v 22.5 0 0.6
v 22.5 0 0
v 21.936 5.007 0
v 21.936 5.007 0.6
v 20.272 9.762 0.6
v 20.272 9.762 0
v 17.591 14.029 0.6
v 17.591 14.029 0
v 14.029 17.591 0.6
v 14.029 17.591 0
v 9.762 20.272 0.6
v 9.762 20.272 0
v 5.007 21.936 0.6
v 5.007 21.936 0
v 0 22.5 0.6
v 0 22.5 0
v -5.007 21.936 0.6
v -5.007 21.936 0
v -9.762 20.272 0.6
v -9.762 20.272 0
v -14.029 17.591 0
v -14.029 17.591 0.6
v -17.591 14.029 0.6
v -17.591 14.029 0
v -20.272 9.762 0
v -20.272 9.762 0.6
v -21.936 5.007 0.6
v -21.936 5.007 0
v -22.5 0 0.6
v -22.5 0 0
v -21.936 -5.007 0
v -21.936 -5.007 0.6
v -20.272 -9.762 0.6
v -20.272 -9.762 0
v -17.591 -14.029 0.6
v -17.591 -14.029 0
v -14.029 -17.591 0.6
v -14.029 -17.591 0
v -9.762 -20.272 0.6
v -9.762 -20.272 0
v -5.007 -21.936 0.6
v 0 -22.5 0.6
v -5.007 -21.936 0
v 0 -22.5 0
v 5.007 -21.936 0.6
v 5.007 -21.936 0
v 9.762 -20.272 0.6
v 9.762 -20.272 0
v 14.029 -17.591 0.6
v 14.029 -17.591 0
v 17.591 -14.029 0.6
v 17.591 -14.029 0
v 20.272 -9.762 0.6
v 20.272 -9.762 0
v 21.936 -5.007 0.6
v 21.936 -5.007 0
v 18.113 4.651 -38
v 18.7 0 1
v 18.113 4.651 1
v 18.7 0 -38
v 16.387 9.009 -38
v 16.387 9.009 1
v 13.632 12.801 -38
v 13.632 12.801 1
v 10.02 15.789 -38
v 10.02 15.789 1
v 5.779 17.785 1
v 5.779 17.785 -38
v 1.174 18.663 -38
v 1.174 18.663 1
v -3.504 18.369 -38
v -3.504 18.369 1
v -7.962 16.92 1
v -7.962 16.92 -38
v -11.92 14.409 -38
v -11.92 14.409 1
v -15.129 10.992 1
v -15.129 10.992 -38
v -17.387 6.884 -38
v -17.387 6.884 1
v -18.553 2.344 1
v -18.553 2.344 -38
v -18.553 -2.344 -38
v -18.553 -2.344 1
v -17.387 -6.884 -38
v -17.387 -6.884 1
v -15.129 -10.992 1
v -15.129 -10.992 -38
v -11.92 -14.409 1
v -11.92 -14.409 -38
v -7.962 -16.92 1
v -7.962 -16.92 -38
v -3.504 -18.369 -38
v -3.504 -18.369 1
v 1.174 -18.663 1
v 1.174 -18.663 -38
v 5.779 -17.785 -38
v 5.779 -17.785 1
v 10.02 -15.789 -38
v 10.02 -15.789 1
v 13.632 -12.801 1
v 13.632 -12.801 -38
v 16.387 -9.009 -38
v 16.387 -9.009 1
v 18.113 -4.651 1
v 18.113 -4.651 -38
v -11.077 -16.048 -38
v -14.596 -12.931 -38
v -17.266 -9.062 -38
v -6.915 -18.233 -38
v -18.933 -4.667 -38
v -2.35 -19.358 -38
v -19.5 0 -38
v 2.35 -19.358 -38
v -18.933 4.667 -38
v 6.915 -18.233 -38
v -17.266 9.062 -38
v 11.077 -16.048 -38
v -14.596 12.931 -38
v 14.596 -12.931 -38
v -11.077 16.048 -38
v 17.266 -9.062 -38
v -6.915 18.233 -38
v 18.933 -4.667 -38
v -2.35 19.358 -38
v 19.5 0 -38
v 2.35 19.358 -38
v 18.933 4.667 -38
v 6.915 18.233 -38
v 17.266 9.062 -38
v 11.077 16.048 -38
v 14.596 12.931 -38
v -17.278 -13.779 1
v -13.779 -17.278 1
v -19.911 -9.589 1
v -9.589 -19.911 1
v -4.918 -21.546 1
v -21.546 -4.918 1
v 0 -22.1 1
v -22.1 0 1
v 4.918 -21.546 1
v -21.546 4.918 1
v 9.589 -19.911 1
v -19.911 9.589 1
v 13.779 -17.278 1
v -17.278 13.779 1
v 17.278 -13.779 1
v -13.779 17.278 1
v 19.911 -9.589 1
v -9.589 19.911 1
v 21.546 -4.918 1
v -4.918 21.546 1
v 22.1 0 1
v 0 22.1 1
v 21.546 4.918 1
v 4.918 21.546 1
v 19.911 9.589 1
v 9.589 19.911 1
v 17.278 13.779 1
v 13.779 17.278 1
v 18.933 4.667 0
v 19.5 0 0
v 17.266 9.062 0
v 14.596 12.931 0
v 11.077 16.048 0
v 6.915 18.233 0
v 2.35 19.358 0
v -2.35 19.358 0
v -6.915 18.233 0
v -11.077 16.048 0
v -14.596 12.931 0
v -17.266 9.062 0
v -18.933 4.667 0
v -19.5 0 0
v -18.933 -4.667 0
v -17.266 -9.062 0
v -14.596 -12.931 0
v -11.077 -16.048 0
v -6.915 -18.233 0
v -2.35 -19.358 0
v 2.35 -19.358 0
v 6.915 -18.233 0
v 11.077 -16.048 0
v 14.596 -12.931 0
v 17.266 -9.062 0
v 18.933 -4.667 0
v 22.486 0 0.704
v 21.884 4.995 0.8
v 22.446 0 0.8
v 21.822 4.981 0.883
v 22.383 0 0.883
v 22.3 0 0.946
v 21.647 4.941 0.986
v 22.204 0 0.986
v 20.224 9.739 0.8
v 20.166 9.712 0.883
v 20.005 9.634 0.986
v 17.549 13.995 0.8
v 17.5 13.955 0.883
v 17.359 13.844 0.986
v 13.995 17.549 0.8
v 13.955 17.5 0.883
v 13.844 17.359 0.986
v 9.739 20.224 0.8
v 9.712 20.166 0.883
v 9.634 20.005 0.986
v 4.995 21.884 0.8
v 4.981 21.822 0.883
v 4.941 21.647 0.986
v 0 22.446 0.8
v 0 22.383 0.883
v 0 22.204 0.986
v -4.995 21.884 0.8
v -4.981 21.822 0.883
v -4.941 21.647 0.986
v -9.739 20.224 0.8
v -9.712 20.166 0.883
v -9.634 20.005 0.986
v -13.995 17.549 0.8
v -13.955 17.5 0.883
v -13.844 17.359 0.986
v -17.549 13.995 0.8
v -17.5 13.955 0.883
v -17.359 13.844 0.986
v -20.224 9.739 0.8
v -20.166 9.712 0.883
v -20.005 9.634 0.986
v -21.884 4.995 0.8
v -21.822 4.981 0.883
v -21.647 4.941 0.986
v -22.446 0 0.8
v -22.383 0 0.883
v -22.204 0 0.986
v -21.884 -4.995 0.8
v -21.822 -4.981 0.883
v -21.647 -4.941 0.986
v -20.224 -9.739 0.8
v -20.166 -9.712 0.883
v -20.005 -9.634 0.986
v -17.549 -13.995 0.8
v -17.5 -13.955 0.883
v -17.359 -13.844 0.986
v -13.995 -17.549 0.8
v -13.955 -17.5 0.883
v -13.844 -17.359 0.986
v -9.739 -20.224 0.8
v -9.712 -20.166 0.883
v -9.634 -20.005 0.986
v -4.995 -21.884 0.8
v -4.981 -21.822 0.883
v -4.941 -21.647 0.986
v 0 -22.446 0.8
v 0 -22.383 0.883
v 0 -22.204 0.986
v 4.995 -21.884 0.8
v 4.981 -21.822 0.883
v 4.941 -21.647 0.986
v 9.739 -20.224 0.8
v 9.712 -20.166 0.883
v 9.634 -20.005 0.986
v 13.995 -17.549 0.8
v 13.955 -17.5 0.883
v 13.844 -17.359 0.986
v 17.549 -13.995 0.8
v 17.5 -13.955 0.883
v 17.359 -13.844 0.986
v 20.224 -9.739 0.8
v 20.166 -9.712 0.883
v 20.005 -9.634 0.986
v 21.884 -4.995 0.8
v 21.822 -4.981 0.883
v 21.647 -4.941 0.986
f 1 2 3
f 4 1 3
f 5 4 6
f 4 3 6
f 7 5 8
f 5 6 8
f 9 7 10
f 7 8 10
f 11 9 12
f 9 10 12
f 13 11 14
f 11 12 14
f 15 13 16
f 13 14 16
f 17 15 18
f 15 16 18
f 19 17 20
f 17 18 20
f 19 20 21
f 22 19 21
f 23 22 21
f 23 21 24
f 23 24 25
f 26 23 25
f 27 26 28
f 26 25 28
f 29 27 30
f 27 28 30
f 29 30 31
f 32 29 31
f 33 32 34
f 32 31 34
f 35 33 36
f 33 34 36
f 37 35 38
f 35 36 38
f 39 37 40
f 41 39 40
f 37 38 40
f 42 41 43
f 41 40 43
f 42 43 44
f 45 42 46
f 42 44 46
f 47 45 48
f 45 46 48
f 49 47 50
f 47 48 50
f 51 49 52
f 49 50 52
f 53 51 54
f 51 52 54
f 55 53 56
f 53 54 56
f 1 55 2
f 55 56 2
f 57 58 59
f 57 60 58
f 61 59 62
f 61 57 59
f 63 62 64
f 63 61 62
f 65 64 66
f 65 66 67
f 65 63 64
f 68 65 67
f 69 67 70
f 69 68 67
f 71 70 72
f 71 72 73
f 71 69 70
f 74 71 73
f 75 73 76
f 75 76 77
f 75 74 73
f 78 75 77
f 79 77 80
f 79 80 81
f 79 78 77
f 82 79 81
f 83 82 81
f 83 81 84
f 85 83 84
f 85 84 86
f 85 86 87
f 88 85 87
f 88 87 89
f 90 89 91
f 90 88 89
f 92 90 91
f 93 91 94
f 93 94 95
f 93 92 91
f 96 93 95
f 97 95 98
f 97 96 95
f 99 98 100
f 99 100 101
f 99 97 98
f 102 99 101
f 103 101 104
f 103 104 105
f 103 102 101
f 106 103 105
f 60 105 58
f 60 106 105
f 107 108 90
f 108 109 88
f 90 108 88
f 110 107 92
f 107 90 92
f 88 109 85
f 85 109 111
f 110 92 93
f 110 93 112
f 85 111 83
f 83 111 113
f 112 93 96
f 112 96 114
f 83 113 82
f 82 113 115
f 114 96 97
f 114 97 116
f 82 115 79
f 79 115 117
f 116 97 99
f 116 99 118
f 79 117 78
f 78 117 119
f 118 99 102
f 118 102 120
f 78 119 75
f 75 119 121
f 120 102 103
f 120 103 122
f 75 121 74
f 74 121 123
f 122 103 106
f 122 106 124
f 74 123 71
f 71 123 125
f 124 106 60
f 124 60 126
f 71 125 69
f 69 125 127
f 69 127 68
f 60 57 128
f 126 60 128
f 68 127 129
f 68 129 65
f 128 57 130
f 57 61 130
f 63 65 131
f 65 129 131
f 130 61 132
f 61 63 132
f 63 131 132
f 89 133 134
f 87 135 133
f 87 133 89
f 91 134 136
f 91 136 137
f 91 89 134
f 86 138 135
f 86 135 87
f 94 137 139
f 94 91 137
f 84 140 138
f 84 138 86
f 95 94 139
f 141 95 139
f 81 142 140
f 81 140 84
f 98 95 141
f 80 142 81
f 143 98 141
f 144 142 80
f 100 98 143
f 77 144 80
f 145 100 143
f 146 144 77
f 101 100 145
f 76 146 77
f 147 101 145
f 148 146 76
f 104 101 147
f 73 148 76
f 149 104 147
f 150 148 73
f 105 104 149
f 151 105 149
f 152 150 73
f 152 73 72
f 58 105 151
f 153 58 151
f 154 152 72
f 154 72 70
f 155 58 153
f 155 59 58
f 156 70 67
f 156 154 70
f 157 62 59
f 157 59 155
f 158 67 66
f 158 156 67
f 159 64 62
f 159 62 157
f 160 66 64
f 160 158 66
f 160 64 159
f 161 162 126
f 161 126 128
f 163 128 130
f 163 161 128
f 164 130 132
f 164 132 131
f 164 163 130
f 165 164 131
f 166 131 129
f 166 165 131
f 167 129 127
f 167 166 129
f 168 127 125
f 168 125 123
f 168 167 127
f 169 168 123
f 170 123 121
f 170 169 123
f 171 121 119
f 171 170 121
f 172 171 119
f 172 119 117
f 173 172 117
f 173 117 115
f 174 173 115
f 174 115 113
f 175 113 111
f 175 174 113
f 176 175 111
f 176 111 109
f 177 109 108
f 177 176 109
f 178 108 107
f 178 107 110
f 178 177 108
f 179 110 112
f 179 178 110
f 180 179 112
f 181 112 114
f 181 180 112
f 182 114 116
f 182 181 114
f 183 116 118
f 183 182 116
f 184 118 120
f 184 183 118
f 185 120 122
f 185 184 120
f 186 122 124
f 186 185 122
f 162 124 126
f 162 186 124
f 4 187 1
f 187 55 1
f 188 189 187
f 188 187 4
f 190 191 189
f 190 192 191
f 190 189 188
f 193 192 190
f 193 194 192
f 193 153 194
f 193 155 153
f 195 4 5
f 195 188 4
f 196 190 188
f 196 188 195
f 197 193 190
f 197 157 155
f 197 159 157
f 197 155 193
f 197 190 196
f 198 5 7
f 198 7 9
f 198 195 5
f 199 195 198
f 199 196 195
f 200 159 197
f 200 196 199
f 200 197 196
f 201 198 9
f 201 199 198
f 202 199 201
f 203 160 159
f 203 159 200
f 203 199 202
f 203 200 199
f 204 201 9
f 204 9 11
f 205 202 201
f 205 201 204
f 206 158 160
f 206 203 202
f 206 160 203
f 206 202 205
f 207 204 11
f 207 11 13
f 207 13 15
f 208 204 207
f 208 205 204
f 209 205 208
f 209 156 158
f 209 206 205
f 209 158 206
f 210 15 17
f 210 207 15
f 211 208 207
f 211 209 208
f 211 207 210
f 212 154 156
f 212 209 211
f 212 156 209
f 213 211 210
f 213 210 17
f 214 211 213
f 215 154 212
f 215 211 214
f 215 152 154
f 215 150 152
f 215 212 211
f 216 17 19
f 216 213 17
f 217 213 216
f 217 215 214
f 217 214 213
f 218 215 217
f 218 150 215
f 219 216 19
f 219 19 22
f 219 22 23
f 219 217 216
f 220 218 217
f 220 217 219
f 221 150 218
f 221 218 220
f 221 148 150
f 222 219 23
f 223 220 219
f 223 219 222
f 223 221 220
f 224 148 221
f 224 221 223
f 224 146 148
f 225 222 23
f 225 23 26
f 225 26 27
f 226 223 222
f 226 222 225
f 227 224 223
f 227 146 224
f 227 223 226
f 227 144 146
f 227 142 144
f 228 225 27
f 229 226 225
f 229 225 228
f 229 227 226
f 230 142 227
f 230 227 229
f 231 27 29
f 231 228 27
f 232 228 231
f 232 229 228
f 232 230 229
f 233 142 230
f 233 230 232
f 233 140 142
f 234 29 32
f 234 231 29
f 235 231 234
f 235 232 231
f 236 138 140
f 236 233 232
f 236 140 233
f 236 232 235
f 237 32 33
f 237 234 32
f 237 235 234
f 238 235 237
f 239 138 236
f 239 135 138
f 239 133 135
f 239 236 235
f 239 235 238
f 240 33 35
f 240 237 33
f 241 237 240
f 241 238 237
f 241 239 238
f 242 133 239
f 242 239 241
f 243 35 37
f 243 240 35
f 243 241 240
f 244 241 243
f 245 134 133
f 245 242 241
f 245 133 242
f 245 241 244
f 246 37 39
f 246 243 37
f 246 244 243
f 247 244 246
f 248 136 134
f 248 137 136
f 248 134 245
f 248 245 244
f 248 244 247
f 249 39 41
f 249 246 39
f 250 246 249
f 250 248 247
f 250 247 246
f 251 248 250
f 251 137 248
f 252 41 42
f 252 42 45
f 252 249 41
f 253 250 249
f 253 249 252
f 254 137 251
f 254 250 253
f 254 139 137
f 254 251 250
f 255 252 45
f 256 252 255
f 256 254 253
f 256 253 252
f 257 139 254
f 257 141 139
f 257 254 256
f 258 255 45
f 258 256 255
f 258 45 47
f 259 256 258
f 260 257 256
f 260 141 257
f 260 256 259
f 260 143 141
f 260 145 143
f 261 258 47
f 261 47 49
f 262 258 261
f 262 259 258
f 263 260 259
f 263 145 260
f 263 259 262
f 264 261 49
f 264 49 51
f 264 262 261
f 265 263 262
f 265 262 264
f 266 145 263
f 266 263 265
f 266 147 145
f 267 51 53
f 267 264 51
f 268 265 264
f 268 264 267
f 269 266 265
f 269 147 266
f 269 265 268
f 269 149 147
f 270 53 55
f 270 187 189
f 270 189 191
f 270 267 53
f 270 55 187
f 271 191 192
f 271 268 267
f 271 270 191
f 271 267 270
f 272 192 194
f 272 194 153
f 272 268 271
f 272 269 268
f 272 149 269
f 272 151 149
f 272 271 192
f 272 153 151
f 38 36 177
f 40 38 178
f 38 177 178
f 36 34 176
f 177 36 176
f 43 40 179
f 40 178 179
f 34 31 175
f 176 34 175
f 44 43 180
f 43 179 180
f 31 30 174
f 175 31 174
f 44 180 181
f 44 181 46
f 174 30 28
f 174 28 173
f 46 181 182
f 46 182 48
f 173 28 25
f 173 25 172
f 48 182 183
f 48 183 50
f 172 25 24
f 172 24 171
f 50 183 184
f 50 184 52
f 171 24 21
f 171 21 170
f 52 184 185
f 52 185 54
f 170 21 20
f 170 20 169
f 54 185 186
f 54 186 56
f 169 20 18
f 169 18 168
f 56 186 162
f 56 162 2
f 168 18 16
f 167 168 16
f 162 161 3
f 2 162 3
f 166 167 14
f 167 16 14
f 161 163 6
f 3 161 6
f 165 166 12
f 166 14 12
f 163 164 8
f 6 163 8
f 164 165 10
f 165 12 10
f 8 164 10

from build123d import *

# Parameters (mm, degrees)
F0_R     = 19.5
F0_R_2   = 18.7
F1_DEPTH = 38
F0_R_3   = 22.5
F2_DEPTH = 1
F3_R     = 0.4


with BuildPart() as f1:
    # F0 (on Top) → F1 (new body)
    with BuildSketch(Plane.XY):
        Circle(F0_R)
        Circle(F0_R_2, mode=Mode.SUBTRACT)
    extrude(amount=-F1_DEPTH)

    # F0 (on Top) → F2 (join)
    with BuildSketch(Plane.XY):
        Circle(F0_R_3)
        Circle(F0_R, mode=Mode.SUBTRACT)
        Circle(F0_R)
        Circle(F0_R_2, mode=Mode.SUBTRACT)
    extrude(amount=F2_DEPTH)

    # F3
    f3_edges = [f1.edges().sort_by_distance(p)[0] for p in [
        (-22.5, 0, 1),
    ]]
    fillet(f3_edges, radius=F3_R)


solid = f1.part
